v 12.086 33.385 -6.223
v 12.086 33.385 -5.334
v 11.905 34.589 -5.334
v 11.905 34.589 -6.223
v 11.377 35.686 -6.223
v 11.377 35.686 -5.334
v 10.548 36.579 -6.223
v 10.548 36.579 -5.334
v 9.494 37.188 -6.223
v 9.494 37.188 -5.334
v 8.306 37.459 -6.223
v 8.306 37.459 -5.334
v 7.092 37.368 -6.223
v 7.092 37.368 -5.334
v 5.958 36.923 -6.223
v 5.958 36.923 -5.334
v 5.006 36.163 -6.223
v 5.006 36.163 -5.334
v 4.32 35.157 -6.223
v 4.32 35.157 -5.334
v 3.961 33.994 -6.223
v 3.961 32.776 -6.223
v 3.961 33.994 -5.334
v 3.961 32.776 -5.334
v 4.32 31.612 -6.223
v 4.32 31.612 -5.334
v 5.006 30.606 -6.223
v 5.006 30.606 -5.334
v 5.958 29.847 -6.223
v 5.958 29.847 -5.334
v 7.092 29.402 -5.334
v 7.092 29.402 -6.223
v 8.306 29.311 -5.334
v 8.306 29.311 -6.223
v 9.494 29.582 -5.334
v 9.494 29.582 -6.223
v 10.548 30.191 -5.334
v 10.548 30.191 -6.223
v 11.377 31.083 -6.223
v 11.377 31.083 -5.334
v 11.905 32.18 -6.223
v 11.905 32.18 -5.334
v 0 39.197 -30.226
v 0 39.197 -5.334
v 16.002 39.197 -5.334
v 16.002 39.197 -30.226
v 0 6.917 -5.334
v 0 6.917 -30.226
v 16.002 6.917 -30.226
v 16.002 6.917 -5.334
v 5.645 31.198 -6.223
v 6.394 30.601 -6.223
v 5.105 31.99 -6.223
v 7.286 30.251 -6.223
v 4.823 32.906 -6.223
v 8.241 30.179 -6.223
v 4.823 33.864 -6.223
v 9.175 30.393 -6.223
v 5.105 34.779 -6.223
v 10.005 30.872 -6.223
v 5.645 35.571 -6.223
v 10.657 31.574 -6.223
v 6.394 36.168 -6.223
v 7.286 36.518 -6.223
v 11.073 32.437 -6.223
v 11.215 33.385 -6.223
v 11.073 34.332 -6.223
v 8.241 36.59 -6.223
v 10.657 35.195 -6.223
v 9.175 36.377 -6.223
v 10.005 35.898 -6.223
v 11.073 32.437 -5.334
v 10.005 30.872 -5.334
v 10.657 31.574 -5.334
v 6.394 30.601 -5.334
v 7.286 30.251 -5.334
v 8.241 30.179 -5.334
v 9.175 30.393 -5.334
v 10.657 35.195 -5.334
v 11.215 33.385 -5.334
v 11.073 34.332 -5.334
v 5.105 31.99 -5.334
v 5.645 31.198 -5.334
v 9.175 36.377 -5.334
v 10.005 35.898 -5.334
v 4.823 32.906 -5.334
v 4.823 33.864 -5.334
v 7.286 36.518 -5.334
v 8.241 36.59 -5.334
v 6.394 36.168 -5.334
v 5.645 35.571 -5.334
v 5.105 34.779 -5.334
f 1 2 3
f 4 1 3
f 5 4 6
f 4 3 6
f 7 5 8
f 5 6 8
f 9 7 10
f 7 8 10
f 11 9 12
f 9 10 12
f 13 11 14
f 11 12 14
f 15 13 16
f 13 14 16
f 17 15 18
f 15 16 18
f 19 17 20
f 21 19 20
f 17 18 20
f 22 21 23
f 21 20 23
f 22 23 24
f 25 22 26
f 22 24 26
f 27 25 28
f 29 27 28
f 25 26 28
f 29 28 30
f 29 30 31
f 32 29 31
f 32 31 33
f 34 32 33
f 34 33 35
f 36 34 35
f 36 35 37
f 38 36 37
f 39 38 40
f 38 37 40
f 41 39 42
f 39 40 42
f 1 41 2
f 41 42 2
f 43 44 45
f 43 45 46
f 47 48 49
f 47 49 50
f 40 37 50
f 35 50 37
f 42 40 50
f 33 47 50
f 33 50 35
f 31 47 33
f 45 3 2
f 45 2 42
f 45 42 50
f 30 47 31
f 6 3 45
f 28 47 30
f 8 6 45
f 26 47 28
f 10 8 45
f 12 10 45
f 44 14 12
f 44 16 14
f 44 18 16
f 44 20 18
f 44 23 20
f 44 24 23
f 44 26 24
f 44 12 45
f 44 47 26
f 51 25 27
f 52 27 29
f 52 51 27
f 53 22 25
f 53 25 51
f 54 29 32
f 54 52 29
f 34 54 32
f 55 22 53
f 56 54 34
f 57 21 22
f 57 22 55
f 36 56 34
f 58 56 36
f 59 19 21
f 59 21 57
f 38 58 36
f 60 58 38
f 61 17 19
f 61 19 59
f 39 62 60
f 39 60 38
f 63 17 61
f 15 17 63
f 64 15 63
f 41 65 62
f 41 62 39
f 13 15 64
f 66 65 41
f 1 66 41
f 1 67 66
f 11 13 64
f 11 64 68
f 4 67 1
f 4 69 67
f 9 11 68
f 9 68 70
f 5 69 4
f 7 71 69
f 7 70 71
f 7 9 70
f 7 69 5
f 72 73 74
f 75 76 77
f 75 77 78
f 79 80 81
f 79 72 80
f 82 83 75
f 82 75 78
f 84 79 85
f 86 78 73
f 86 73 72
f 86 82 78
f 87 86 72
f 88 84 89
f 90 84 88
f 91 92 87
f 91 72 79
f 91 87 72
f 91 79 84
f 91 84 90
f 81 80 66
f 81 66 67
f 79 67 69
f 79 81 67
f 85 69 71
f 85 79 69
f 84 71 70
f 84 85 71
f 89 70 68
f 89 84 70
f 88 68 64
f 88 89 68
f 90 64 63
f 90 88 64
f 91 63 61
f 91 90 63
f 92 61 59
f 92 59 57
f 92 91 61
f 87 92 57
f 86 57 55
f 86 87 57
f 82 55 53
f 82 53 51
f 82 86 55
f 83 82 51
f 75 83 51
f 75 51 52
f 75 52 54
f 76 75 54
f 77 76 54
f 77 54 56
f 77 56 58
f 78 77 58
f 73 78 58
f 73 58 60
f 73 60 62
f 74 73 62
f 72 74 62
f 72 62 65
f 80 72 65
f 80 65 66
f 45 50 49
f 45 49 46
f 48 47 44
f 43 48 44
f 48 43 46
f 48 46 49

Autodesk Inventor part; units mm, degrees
ref_plane "YZ Plane" through (0, 0, 0) normal (1, 0, 0) x (0, 1, 0)
ref_plane "XZ Plane" through (0, 0, 0) normal (0, 1, 0) x (-1, 0, 0)
ref_plane "XY Plane" through (0, 0, 0) normal (0, 0, 1) x (1, 0, 0)
sketch "Sketch1" plane through (0, 0, 0) normal (1, 0, 0) x (0, 1, 0)
  line L0 (0, 0) -> (46.1137, 0)
  line L1 (46.1137, 0) -> (46.1137, -35.56)
  line L2 (46.1137, -35.56) -> (0, -35.56)
  line L3 (0, -35.56) -> (0, 0)
  dimension "d0" = 46.1137
  dimension "d1" = 35.56
extrude "Extrusion1" add sketch "Sketch1" along normal blind 22.86
sketch "Sketch2" plane through (0, 0, 0) normal (0, 0, 1) x (1, 0, 0)
  circle A0 centre (11.43, 37.8108) radius 5.8364
  circle A1 centre (11.43, 37.8108) radius 4.5919
  point P0 (0, 0)
extrude "Extrusion2" cut sketch "Sketch2" against normal blind 1.27
scale "Scale1" factors (0.7, 0.7, 0.7) then translate (0, 6.9171, -5.334) bodies 1
properties part number "aqisensor"
